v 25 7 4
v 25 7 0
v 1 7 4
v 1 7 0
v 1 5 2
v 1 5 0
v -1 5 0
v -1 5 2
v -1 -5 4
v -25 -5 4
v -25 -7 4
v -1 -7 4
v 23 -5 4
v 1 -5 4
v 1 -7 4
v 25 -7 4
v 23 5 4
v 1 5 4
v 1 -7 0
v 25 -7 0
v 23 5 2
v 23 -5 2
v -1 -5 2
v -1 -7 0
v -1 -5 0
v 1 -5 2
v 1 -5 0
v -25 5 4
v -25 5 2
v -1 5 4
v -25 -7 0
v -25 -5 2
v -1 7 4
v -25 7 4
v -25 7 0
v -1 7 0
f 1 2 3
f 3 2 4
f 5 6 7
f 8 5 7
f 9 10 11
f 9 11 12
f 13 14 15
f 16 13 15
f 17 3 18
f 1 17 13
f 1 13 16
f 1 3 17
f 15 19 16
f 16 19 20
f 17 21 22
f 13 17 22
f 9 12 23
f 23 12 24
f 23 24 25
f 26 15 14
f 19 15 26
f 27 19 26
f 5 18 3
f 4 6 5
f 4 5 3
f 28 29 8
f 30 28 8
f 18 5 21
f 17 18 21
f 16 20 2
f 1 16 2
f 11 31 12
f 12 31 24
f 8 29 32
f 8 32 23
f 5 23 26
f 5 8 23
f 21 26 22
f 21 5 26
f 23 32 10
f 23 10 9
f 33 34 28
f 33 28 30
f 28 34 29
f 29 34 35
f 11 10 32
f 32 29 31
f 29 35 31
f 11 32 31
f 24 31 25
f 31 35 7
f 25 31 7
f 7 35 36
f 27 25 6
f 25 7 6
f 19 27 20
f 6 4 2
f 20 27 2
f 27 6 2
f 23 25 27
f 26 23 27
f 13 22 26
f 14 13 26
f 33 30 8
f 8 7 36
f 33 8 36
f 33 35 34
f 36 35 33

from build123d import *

# Parameters (mm, degrees)
F0_W     = 24
F0_H     = 10
F0_H_2   = 2
F0_W_2   = 2
F0_W_3   = 22
F1_DEPTH = 2
F2_DEPTH = 4


with BuildPart() as f1:
    # F0 (on Top) → F1 (new body)
    with BuildSketch(Plane.XY):
        with Locations((-13, 0)):
            Rectangle(F0_W, F0_H)
        with Locations((-13, -6)):
            Rectangle(F0_W, F0_H_2)
        Rectangle(F0_W_2, F0_H)
        with Locations((12, -6)):
            Rectangle(F0_W_3, F0_H_2)
        with Locations((24, -6)):
            Rectangle(F0_W_2, F0_H_2)
        with Locations((24, 0)):
            Rectangle(F0_W_2, F0_H)
        with Locations((12, 0)):
            Rectangle(F0_W_3, F0_H)
        with Locations((12, 6)):
            Rectangle(F0_W_3, F0_H_2)
        with Locations((-13, 6)):
            Rectangle(F0_W, F0_H_2)
        with Locations((24, 6)):
            Rectangle(F0_W_2, F0_H_2)
    extrude(amount=F1_DEPTH)

    # F0 (on Top) → F2 (join)
    with BuildSketch(Plane.XY):
        with Locations((12, -6)):
            Rectangle(F0_W_3, F0_H_2)
        with Locations((24, -6)):
            Rectangle(F0_W_2, F0_H_2)
        with Locations((24, 0)):
            Rectangle(F0_W_2, F0_H)
        with Locations((24, 6)):
            Rectangle(F0_W_2, F0_H_2)
        with Locations((12, 6)):
            Rectangle(F0_W_3, F0_H_2)
        with Locations((-13, 6)):
            Rectangle(F0_W, F0_H_2)
        with Locations((-13, -6)):
            Rectangle(F0_W, F0_H_2)
    extrude(amount=F2_DEPTH)


solid = f1.part
